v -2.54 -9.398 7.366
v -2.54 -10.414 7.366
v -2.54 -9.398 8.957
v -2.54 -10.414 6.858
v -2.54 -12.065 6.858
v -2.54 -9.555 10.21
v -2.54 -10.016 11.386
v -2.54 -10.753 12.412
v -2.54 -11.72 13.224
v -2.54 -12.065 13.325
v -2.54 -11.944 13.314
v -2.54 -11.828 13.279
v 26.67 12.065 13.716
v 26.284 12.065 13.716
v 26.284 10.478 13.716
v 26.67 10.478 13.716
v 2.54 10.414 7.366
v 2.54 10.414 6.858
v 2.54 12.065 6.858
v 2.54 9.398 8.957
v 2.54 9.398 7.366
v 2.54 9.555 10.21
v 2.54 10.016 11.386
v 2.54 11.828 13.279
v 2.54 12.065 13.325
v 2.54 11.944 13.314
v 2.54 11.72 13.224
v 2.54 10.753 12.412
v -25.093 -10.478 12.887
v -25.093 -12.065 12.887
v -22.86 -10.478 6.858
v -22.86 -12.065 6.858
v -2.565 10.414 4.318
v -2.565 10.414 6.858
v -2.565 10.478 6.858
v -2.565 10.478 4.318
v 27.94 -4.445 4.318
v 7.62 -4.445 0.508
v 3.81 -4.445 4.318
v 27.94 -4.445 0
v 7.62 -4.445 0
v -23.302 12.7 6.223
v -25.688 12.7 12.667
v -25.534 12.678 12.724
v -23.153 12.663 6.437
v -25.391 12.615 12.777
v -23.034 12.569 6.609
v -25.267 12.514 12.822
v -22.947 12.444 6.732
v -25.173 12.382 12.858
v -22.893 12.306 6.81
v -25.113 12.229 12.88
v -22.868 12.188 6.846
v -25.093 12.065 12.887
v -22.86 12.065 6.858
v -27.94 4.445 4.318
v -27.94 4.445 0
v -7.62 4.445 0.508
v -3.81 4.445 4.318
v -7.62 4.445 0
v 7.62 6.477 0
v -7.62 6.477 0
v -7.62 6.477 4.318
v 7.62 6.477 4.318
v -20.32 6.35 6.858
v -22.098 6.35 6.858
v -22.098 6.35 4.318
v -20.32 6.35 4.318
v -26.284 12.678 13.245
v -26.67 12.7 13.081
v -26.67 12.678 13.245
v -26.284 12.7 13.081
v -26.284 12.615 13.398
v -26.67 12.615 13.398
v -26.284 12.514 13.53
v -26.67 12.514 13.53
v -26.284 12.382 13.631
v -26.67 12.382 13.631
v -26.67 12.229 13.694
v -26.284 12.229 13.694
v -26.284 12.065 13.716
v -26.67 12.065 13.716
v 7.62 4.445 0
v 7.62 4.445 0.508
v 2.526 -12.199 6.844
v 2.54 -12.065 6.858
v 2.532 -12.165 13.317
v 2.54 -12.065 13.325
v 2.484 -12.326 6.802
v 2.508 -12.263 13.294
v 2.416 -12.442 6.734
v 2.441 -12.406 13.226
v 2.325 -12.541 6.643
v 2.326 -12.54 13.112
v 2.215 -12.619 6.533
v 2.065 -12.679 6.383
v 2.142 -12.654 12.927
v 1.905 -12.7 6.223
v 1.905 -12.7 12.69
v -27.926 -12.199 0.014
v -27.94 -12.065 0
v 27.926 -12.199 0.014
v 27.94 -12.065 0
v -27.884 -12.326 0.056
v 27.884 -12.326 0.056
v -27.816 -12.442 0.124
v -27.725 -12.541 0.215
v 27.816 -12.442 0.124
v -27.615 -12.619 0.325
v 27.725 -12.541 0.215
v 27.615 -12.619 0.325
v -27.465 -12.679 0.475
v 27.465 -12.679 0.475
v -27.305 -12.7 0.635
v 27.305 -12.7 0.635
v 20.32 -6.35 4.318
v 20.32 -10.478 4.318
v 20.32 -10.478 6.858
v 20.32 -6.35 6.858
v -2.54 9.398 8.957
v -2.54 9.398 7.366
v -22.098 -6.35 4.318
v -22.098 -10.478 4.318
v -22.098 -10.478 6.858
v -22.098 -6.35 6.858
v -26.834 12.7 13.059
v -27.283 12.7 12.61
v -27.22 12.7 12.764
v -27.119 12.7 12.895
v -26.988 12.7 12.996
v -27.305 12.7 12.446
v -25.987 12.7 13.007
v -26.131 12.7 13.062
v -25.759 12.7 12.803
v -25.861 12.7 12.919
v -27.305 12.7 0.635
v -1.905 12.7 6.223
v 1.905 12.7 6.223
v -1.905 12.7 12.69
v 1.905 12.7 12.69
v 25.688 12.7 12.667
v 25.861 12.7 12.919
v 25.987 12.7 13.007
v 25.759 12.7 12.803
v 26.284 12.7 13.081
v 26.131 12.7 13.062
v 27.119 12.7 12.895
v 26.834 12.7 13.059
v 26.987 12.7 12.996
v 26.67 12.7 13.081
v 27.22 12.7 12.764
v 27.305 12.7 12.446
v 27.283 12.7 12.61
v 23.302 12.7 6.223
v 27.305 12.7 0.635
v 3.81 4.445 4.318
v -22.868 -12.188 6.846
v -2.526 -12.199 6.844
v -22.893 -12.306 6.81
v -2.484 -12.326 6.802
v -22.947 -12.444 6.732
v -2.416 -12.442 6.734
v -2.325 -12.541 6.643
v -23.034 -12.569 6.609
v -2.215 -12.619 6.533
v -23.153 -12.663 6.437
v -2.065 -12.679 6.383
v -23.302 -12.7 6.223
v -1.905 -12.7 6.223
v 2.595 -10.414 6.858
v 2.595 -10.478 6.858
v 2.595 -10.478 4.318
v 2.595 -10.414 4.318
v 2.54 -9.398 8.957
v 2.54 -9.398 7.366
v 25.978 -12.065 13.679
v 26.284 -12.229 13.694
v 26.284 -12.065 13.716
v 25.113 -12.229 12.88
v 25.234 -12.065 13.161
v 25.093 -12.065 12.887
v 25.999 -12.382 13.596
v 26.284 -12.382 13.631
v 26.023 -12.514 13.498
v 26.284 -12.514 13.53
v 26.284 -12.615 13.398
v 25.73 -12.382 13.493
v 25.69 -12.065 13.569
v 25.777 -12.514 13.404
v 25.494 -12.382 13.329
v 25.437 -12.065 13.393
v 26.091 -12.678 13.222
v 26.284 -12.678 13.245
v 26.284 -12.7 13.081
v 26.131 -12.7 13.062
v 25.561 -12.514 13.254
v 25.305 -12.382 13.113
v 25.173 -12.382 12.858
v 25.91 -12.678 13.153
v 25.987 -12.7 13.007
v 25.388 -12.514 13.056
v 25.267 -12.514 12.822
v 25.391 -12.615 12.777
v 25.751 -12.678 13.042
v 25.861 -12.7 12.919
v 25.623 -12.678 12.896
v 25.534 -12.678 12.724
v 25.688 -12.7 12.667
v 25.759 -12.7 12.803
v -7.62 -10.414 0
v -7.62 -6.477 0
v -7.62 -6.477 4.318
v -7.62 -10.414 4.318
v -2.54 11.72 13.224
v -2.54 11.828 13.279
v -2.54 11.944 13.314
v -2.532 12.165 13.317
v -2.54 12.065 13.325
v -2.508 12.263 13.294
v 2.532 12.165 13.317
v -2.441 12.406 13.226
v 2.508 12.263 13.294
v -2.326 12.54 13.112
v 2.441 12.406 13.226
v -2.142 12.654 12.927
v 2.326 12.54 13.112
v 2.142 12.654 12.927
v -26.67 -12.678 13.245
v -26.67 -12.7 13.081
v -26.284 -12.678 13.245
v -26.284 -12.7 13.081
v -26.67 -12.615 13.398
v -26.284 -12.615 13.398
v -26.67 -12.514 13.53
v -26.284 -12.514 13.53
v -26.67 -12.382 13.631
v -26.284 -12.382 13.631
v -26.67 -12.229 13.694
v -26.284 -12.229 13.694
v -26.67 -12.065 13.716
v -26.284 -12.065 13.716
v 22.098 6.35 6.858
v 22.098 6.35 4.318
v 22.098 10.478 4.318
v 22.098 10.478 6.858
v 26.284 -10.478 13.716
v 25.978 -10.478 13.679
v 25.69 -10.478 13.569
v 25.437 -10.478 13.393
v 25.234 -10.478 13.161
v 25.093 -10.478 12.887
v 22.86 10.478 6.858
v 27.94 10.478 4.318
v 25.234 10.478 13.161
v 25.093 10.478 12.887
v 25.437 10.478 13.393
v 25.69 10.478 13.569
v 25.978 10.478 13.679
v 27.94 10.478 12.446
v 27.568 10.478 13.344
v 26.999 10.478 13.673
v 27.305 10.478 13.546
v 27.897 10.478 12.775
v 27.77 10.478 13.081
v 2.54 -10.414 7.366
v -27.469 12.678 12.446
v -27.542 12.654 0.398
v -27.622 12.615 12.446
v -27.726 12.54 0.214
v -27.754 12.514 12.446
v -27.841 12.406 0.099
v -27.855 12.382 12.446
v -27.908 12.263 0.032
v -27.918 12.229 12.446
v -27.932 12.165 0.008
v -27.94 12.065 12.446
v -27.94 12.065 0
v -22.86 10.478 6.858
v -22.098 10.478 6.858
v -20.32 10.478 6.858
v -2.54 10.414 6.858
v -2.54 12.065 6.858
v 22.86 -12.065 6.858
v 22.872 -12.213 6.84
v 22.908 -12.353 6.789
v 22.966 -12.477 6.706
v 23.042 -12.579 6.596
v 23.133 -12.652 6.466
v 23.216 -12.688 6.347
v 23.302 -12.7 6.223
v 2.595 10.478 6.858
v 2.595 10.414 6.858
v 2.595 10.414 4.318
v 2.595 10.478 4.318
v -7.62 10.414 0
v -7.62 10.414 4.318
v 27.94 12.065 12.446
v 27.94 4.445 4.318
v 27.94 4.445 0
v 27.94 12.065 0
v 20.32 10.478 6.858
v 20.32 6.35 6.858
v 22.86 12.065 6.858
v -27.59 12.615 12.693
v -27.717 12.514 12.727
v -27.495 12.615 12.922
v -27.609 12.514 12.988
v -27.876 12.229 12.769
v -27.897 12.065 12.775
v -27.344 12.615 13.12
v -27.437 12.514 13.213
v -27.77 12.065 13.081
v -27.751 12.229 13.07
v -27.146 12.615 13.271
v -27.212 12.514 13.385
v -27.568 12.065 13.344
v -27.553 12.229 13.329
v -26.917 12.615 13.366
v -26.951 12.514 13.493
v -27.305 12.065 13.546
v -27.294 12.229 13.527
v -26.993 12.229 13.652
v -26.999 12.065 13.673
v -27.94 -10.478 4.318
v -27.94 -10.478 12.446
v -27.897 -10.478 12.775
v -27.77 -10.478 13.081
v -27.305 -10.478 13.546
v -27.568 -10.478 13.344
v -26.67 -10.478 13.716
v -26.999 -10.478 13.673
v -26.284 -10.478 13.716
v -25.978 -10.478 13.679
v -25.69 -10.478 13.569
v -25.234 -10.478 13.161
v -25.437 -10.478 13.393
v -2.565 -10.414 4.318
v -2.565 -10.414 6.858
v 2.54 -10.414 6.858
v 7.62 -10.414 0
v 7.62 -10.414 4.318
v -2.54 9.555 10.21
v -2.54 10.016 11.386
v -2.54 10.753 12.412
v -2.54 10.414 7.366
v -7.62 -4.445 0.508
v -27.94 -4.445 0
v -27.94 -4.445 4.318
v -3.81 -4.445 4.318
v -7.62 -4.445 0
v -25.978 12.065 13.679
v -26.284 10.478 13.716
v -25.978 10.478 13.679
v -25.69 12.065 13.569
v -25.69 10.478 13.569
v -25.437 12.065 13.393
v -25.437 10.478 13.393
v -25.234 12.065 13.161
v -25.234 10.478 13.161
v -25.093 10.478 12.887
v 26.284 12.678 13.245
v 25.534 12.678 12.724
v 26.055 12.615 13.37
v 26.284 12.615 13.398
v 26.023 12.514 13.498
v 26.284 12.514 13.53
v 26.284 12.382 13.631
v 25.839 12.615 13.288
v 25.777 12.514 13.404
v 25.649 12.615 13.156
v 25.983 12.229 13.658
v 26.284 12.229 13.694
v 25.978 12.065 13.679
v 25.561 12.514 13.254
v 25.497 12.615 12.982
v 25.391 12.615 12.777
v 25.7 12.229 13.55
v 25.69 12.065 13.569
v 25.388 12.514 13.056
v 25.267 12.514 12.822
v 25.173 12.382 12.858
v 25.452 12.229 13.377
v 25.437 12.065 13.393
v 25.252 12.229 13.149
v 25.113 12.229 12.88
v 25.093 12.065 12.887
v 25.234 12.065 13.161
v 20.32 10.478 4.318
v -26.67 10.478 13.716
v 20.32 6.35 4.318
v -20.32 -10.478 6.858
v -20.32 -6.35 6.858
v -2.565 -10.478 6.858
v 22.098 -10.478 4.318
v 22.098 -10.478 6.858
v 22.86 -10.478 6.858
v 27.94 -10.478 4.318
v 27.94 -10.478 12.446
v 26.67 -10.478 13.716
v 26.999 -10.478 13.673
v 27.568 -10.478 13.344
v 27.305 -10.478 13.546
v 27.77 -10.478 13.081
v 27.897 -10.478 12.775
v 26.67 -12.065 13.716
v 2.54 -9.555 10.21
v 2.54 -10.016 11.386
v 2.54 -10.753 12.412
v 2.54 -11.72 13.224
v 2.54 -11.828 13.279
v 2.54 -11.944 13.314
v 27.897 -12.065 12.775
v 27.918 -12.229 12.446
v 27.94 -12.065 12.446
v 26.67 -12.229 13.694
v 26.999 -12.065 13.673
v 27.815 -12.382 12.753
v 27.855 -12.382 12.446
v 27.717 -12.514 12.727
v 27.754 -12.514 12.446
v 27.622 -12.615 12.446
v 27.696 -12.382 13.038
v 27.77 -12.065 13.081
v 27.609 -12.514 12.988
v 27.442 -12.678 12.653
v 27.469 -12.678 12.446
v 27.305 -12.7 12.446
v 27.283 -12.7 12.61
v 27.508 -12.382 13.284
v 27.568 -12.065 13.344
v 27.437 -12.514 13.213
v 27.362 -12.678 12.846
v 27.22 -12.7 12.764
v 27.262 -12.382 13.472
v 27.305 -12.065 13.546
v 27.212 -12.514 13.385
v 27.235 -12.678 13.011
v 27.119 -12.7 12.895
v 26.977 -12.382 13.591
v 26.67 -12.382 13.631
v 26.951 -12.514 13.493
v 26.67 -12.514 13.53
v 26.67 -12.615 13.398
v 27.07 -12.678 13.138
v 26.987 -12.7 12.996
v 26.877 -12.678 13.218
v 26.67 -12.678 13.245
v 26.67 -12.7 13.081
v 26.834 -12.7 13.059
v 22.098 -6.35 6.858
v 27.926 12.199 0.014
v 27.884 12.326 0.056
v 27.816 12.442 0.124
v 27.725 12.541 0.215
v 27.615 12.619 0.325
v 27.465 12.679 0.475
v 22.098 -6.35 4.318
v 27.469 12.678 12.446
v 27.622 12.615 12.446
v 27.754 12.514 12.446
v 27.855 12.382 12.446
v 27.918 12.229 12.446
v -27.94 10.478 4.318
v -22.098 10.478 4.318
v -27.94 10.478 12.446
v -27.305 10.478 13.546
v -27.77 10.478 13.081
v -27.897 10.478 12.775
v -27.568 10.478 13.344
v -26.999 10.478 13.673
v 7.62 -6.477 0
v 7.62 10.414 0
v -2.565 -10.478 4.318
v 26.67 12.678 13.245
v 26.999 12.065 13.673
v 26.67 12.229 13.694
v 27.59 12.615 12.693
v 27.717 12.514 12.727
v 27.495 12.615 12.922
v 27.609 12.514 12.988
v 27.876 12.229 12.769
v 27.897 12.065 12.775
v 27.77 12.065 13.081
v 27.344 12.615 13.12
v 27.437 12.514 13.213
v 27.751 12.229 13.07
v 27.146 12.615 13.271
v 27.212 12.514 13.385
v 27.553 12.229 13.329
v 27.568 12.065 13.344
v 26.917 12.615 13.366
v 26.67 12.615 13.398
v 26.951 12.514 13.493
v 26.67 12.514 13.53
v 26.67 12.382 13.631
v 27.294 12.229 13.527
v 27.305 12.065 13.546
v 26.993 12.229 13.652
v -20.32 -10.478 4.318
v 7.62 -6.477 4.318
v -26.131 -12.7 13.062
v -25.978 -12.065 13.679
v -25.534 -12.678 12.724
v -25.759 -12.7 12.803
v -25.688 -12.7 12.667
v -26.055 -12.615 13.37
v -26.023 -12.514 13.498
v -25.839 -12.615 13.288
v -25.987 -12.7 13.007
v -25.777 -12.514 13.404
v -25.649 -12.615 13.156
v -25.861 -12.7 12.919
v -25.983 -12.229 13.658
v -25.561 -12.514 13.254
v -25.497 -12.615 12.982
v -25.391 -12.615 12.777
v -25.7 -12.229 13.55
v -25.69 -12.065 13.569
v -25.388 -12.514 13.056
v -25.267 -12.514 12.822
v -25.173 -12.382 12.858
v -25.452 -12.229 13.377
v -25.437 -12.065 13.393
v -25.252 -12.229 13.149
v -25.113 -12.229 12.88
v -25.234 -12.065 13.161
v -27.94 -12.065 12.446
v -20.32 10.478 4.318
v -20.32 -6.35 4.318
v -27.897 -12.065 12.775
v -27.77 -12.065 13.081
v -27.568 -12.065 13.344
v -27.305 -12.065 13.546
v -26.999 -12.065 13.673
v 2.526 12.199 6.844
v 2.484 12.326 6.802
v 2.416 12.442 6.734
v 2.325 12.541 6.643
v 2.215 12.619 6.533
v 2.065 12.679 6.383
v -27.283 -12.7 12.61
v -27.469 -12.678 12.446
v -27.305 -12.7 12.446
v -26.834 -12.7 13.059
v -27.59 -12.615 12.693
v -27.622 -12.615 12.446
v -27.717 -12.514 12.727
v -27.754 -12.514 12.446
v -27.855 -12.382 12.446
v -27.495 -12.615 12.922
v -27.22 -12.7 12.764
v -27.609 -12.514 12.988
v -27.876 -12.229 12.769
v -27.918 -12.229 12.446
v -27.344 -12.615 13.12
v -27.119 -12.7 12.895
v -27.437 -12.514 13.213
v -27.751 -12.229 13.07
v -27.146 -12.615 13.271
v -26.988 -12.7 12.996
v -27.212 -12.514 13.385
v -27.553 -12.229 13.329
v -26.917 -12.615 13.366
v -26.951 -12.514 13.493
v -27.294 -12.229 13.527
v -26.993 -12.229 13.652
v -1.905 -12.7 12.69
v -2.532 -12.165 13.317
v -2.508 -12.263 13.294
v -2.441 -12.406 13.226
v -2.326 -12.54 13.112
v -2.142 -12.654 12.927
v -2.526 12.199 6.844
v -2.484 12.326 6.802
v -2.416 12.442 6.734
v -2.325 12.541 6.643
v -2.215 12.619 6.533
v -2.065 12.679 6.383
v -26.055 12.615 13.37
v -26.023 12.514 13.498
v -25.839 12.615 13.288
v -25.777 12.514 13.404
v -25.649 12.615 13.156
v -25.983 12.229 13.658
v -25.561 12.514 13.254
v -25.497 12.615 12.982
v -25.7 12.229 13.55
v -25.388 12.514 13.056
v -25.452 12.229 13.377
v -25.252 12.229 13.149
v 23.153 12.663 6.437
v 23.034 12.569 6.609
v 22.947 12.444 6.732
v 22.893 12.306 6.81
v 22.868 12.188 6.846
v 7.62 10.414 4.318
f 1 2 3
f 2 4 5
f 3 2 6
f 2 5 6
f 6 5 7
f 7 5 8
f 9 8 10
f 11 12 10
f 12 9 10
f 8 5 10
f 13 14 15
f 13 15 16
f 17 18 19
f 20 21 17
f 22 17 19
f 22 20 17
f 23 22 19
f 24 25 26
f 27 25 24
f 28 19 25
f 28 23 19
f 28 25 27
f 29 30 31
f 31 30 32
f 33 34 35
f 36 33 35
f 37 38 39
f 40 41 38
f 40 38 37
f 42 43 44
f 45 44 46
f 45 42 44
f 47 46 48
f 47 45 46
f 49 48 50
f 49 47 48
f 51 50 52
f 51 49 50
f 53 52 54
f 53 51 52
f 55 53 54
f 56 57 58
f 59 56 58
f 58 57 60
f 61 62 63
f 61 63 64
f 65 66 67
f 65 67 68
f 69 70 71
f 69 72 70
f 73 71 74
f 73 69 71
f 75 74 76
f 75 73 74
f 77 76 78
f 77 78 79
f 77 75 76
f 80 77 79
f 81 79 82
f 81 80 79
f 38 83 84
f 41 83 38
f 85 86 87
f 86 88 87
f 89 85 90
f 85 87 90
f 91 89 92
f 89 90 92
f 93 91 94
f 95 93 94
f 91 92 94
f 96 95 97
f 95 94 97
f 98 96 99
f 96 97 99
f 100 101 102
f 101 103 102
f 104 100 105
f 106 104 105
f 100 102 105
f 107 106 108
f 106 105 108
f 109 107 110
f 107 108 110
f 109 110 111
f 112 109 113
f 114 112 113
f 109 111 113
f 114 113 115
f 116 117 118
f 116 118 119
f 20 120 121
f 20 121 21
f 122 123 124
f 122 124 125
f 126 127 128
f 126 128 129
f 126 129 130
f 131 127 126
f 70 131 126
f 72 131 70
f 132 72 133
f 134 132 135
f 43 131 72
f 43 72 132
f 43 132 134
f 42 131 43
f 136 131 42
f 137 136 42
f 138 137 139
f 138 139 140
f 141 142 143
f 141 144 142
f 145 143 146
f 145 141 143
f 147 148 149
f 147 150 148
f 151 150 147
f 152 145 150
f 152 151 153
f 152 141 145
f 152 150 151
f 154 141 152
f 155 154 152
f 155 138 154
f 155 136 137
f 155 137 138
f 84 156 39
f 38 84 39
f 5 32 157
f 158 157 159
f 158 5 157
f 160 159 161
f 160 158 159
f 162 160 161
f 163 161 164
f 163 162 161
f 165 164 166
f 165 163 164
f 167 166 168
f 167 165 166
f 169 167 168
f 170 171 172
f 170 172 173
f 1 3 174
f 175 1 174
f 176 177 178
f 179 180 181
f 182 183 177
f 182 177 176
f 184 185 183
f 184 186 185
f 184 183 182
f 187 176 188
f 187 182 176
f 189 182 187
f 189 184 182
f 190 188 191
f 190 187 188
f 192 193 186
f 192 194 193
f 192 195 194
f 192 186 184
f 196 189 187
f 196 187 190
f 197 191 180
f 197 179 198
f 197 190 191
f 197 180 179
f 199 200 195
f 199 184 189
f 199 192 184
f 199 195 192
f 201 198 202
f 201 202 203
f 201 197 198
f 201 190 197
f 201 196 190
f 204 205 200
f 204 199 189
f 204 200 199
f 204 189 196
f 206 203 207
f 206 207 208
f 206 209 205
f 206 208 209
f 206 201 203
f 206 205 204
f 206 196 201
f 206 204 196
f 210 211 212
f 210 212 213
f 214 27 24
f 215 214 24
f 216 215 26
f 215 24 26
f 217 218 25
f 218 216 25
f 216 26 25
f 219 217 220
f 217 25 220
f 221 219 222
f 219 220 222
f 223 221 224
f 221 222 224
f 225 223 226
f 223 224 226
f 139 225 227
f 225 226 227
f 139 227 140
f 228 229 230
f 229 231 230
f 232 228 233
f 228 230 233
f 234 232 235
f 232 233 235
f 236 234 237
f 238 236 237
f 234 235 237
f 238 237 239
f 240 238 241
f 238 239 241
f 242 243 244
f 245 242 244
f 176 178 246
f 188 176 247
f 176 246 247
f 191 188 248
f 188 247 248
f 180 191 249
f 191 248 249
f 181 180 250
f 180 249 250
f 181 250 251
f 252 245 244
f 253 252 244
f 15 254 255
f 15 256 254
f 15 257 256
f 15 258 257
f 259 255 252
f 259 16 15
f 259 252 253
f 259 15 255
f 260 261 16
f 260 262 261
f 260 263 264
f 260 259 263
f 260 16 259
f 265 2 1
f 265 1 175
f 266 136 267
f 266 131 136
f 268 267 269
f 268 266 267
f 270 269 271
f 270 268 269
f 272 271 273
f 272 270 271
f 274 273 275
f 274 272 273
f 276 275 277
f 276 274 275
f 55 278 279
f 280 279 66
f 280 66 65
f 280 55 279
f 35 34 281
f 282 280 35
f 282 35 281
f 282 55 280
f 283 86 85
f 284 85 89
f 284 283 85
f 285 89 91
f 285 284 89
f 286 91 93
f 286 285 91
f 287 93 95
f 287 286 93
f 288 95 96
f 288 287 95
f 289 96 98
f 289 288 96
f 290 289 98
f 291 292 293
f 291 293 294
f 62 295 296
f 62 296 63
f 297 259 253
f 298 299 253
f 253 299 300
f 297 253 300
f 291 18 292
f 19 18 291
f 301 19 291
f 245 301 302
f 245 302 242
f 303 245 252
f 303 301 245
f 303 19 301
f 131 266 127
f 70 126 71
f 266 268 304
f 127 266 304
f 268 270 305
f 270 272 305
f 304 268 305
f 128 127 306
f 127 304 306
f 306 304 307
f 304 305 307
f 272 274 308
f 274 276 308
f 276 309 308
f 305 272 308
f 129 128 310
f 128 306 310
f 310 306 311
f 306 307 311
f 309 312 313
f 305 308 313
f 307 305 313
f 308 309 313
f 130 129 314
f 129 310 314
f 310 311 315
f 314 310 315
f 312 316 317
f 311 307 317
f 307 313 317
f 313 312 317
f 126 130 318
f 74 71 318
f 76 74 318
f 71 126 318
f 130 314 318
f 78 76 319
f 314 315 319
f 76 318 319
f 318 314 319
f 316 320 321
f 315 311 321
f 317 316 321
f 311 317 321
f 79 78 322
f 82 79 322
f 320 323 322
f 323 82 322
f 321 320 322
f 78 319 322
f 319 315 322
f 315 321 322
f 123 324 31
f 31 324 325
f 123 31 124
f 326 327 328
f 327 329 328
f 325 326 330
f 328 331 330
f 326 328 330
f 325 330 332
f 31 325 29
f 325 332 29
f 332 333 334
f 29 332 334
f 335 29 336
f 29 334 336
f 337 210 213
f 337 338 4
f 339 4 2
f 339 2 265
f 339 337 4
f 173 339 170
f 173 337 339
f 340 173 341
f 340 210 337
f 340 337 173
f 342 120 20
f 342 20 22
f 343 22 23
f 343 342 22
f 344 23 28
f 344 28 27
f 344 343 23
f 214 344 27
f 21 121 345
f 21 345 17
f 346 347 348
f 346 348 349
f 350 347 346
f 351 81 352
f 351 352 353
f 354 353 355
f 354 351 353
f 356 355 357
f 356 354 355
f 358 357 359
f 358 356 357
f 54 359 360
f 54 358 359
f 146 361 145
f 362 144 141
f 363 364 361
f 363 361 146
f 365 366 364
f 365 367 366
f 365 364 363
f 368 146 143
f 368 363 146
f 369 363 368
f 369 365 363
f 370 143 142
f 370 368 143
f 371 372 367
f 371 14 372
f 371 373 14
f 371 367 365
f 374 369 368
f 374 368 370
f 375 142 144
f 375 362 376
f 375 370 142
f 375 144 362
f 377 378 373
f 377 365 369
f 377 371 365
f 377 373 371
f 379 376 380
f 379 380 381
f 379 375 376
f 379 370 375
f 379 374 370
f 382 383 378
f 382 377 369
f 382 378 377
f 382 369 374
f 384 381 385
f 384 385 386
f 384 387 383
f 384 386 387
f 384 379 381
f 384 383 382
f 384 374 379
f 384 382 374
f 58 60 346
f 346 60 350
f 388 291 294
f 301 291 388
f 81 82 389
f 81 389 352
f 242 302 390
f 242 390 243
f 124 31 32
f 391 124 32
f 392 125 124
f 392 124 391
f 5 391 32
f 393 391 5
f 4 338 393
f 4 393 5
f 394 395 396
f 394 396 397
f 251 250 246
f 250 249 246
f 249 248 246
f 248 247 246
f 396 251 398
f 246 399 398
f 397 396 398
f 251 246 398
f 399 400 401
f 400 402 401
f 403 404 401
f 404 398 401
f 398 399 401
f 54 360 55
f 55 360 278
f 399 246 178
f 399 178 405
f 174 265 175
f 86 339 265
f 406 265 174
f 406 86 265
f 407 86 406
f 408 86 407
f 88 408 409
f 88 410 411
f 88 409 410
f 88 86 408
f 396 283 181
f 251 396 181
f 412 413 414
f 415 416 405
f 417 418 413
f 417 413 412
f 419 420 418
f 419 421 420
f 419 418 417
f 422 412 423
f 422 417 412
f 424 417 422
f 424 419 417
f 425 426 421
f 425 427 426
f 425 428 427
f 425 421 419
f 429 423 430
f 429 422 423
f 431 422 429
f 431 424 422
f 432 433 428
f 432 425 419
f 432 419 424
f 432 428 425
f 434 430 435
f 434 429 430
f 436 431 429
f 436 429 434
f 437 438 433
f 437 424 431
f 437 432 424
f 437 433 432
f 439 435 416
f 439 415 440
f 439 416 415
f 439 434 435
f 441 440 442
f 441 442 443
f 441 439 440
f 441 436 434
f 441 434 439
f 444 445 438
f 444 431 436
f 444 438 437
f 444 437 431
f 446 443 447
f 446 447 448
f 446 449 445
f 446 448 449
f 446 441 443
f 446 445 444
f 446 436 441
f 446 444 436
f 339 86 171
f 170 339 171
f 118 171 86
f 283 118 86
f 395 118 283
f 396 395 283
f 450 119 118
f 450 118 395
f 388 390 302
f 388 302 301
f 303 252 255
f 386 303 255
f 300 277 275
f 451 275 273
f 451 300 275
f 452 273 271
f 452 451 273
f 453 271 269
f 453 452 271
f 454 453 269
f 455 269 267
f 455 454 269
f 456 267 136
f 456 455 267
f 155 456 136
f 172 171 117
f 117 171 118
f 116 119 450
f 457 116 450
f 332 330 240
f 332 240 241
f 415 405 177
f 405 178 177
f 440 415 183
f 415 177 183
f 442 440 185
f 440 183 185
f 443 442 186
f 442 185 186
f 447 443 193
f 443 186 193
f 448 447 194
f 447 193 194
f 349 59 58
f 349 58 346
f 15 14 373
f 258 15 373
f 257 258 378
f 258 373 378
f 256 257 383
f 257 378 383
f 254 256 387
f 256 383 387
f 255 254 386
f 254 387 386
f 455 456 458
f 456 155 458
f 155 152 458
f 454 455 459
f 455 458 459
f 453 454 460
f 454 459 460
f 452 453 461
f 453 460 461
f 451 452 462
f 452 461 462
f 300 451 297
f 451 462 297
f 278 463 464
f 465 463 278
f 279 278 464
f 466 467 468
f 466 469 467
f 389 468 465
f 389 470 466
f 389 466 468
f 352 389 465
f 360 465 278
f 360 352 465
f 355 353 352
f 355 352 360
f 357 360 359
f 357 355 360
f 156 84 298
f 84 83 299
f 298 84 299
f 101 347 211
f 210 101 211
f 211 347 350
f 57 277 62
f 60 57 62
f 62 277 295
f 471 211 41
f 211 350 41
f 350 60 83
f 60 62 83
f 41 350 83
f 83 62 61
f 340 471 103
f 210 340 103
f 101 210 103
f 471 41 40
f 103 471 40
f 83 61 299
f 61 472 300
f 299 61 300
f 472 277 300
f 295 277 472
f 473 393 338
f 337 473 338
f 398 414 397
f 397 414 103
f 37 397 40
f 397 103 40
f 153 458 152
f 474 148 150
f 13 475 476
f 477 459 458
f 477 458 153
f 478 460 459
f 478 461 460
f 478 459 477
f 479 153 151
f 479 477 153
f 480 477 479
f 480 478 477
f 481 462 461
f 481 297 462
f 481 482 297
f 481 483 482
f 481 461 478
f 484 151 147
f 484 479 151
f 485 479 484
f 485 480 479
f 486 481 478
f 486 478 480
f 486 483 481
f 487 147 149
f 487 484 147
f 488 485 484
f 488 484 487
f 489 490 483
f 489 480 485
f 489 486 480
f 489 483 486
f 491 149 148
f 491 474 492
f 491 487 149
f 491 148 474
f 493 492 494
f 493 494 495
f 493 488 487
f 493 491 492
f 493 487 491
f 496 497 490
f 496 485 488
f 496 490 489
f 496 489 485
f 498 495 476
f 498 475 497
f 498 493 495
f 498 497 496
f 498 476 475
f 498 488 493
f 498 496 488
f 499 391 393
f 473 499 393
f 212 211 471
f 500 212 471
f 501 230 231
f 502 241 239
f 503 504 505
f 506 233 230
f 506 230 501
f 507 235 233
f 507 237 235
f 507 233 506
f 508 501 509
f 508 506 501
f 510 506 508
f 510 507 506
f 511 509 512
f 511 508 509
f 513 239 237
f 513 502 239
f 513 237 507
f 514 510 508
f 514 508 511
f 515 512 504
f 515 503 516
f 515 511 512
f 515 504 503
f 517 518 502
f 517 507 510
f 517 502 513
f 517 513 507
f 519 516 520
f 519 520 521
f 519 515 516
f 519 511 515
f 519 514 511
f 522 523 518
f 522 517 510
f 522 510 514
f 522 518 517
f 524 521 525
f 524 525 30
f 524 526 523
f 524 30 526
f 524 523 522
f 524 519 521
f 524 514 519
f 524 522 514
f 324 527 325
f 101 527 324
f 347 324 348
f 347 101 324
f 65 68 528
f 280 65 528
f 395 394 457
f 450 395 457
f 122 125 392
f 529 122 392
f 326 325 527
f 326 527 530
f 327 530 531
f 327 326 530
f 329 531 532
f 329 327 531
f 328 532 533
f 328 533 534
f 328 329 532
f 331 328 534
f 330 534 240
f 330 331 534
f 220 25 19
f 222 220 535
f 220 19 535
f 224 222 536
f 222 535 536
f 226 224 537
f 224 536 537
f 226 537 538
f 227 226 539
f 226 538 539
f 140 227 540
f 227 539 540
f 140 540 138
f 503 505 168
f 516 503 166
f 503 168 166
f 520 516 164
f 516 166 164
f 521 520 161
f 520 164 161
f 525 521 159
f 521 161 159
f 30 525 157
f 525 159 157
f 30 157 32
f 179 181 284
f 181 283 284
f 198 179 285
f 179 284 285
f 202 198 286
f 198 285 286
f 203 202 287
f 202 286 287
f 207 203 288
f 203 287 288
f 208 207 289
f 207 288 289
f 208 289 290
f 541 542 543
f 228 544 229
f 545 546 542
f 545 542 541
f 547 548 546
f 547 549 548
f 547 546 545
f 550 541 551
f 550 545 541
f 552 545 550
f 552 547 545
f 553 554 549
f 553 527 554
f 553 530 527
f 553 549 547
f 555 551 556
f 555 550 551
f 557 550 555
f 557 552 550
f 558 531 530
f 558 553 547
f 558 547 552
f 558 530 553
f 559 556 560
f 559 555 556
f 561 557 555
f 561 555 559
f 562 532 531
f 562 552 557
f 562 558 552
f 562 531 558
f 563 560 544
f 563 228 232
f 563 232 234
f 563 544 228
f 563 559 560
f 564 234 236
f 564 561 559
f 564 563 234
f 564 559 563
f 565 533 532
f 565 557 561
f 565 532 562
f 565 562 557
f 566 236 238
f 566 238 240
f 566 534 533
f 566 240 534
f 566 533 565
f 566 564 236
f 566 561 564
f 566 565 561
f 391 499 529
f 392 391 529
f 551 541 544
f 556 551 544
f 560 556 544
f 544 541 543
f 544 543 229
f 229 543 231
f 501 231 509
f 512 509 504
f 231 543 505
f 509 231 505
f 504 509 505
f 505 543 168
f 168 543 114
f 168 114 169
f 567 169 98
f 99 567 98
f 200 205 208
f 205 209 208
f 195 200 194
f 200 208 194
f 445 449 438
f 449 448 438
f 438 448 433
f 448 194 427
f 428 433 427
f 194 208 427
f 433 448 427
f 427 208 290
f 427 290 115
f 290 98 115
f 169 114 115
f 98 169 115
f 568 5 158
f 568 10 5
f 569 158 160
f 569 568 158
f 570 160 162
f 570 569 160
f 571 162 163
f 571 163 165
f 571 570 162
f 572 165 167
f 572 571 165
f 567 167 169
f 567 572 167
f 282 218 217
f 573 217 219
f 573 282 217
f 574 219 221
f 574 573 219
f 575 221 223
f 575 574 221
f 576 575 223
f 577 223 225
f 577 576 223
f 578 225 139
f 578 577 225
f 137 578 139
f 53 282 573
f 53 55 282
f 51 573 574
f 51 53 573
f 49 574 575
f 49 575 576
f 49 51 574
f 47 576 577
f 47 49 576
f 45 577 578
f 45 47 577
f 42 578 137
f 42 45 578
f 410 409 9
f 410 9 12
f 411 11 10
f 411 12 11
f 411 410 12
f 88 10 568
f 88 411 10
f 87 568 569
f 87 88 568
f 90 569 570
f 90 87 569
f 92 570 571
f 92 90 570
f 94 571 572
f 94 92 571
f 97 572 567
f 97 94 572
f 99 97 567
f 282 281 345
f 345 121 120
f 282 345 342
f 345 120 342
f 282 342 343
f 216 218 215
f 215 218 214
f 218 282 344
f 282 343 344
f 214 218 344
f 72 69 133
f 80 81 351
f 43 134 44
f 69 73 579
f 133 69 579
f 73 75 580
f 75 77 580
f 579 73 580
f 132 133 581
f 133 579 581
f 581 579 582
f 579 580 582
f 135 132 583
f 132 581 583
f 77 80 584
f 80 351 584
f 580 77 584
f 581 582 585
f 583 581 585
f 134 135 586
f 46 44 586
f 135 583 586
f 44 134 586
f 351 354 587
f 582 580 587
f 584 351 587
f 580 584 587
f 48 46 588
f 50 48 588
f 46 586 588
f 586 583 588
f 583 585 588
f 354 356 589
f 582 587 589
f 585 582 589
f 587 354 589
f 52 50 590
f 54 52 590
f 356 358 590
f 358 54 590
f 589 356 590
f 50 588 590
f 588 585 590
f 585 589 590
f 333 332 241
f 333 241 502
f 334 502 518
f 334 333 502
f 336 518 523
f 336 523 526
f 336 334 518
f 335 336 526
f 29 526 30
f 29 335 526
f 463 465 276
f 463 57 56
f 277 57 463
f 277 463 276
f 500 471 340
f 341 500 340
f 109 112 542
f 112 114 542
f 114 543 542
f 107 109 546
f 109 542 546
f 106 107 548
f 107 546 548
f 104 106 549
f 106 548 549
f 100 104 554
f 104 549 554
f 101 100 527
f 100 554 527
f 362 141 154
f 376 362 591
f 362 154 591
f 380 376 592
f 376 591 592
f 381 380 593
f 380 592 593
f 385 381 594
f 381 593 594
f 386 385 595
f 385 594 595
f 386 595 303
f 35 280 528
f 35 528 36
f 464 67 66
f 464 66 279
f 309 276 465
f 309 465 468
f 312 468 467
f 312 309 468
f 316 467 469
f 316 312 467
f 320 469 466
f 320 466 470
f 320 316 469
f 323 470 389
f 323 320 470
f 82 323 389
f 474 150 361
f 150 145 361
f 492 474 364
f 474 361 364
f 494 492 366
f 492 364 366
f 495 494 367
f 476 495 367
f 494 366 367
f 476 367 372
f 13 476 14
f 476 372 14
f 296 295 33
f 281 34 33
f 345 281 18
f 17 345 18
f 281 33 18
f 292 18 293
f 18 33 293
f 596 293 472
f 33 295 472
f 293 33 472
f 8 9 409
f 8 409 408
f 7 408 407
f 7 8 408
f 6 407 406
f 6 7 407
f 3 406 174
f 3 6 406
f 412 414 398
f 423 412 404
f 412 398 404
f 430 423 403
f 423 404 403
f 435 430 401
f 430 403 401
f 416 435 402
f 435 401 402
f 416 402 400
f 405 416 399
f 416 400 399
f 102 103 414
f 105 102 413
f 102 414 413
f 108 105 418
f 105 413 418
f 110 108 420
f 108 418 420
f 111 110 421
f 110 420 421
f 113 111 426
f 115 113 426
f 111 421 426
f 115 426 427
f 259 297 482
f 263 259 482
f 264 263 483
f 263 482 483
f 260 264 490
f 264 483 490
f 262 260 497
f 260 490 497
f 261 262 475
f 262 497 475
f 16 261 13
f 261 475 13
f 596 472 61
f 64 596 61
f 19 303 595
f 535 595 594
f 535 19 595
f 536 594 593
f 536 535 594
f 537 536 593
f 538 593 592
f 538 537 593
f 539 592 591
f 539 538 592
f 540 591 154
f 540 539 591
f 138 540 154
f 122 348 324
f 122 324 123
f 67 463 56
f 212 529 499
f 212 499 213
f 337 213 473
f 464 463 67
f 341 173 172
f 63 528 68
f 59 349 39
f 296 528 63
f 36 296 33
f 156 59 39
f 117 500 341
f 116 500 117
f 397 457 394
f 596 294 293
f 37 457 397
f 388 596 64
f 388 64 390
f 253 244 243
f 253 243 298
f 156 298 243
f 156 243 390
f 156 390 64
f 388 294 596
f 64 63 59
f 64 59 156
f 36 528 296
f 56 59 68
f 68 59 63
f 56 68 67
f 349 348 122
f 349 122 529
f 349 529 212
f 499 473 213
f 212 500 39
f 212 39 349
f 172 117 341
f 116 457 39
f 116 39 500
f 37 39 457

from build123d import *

# Parameters (mm, degrees)
F0_W         = 55.88
F0_H         = 25.4
F1_DEPTH     = 13.716
F2_W         = 20.32
F2_H         = 8.89
F3_DEPTH     = 13.717
F4_W         = 20.32
F4_H         = 8.89
F5_DEPTH     = 13.717
F6_W         = 15.24
F6_H         = 3.937
F7_DEPTH     = 7.366
F8_W         = 15.24
F8_H         = 3.937
F9_DEPTH     = 7.366
F10_W        = 55.88
F10_H        = 18.796
F11_DEPTH    = 9.398
F12_W        = 20.32
F12_H        = 6.858
F13_DEPTH    = 25.401
F14_W        = 20.32
F14_H        = 6.858
F15_DEPTH    = 25.401
F17_DEPTH    = 25.401
F19_DEPTH    = 25.401
F20_R        = 1.27
F21_W        = 38.1
F21_H        = 20.955
F22_DEPTH    = 9.398
F23_W        = 38.1
F23_H        = 20.955
F24_DEPTH    = 9.398
F25_T1_DEPTH = 28.8734423739
F26_W        = 1.778
F26_H        = 20.955
F27_DEPTH    = 2.54
F28_W        = 1.778
F28_H        = 20.955
F29_DEPTH    = 2.54
F30_W        = 55.88
F30_H        = 12.7
F31_DEPTH    = 2.54
F32_SIZE     = 3.81
F33_R        = 0.635


# Not quite as in the source:
# - a fillet or chamfer that OpenCascade refuses, or shapes differently, is made with other operations: its cross-section is extruded or revolved along the edge and cut away or added


with BuildPart() as f1:
    # F0 (on Top) → F1 (new body)
    with BuildSketch(Plane.XY):
        Rectangle(F0_W, F0_H)
    extrude(amount=F1_DEPTH)

    # F2 (on face) → F3 (cut, through all)
    with BuildSketch(Plane(origin=(0, 0, 0), x_dir=(1, 0, 0), z_dir=(0, 0, -1))):
        with Locations((17.78, 0)):
            Rectangle(F2_W, F2_H)
    extrude(amount=-F3_DEPTH, mode=Mode.SUBTRACT)

    # F4 (on face) → F5 (cut, through all)
    with BuildSketch(Plane(origin=(0, 0, 0), x_dir=(1, 0, 0), z_dir=(0, 0, -1))):
        with Locations((-17.78, 0)):
            Rectangle(F4_W, F4_H)
    extrude(amount=-F5_DEPTH, mode=Mode.SUBTRACT)

    # F6 (on face) → F7 (cut)
    with BuildSketch(Plane(origin=(0, 0, 0), x_dir=(1, 0, 0), z_dir=(0, 0, -1))):
        with Locations((0, 8.4455)):
            Rectangle(F6_W, F6_H)
    extrude(amount=-F7_DEPTH, mode=Mode.SUBTRACT)

    # F8 (on face) → F9 (cut)
    with BuildSketch(Plane(origin=(0, 0, 0), x_dir=(1, 0, 0), z_dir=(0, 0, -1))):
        with Locations((0, -8.4455)):
            Rectangle(F8_W, F8_H)
    extrude(amount=-F9_DEPTH, mode=Mode.SUBTRACT)

    # F10 (on face) → F11 (cut)
    with BuildSketch(Plane.XY.offset(13.716)):
        Rectangle(F10_W, F10_H)
    extrude(amount=-F11_DEPTH, mode=Mode.SUBTRACT)

    # F12 (on face) → F13 (cut, through all)
    with BuildSketch(Plane.XZ.offset(12.7)):
        with Locations((-12.7, 10.287)):
            Rectangle(F12_W, F12_H)
    extrude(amount=-F13_DEPTH, mode=Mode.SUBTRACT)

    # F14 (on face) → F15 (cut, through all)
    with BuildSketch(Plane.XZ.offset(12.7)):
        with Locations((12.7, 10.287)):
            Rectangle(F14_W, F14_H)
    extrude(amount=-F15_DEPTH, mode=Mode.SUBTRACT)

    # F16 (on face) → F17 (cut, through all)
    with BuildSketch(Plane.XZ.offset(12.7)):
        Polygon((-25.4, 13.716), (-22.86, 6.858), (-22.86, 13.716), align=None)
    extrude(amount=-F17_DEPTH, mode=Mode.SUBTRACT)

    # F18 (on face) → F19 (cut, through all)
    with BuildSketch(Plane.XZ.offset(12.7)):
        Polygon((22.86, 13.716), (22.86, 6.858), (25.4, 13.716), align=None)
    extrude(amount=-F19_DEPTH, mode=Mode.SUBTRACT)

    # F20
    f20_edges = [f1.edges().sort_by_distance(p)[0] for p in [
        (-25.4, 11.049, 13.716),
        (-25.4, -11.049, 13.716),
        (25.4, 11.049, 13.716),
        (25.4, -11.049, 13.716),
        (-27.94, 11.049, 13.716),
        (-27.94, -11.049, 13.716),
        (27.94, -11.049, 13.716),
        (27.94, 11.049, 13.716),
    ]]
    fillet(f20_edges, radius=F20_R)

    # F21 (on face) → F22 (cut)
    with BuildSketch(Plane.XY.offset(13.716)):
        with Locations((-21.6148423028, 0)):
            Rectangle(F21_W, F21_H)
    extrude(amount=-F22_DEPTH, mode=Mode.SUBTRACT)

    # F23 (on face) → F24 (cut)
    with BuildSketch(Plane.XY.offset(13.716)):
        with Locations((21.6445253996, 0)):
            Rectangle(F23_W, F23_H)
    extrude(amount=-F24_DEPTH, mode=Mode.SUBTRACT)

    # F25: fillet of radius 5.08 on 2 edges, made by hand

    # F25_s2 → F25_t1 (cut)
    with BuildSketch(Plane.YZ.offset(-14.4367211869)):
        with BuildLine():
            ThreePointArc((9.398, 8.9573115252), (10.3043541118, 11.853357105), (12.7, 13.716))
            Line((12.7, 13.716), (9.398, 13.716))
            Line((9.398, 13.716), (9.398, 8.9573115252))
        make_face()
        with BuildLine():
            ThreePointArc((-12.7, 13.716), (-10.3043541118, 11.853357105), (-9.398, 8.9573115252))
            Line((-9.398, 8.9573115252), (-9.398, 13.716))
            Line((-9.398, 13.716), (-12.7, 13.716))
        make_face()
    extrude(amount=F25_T1_DEPTH, mode=Mode.SUBTRACT)

    # F26 (on face) → F27 (join)
    with BuildSketch(Plane.XY.offset(4.318)):
        with Locations((21.209, 0)):
            Rectangle(F26_W, F26_H)
    extrude(amount=F27_DEPTH)

    # F28 (on face) → F29 (join)
    with BuildSketch(Plane.XY.offset(4.318)):
        with Locations((-21.209, 0)):
            Rectangle(F28_W, F28_H)
    extrude(amount=F29_DEPTH)

    # F30 (on face) → F31 (cut)
    with BuildSketch(Plane.XY.offset(6.858)):
        with Locations((-0.1600864343, 0)):
            Rectangle(F30_W, F30_H)
    extrude(amount=-F31_DEPTH, mode=Mode.SUBTRACT)

    # F32
    f32_edges = [f1.edges().sort_by_distance(p)[0] for p in [
        (7.62, 0, 4.318),
        (-7.62, 0, 4.318),
    ]]
    chamfer(f32_edges, length=F32_SIZE)

    # F33
    f33_edges = [f1.edges().sort_by_distance(p)[0] for p in [
        (27.94, -12.7, 6.223),
        (27.568026, -12.7, 13.344026),
        (0, -12.7, 0),
        (26.476968, -12.7, 13.716),
        (-27.94, -12.7, 6.223),
        (25.558431, -12.7, 13.488373),
        (-27.568026, -12.7, 13.344026),
        (23.976498, -12.7, 9.872545),
        (-26.476968, -12.7, 13.716),
        (12.7, -12.7, 6.858),
        (-25.558431, -12.7, 13.488373),
        (2.54, -12.7, 10.287),
        (-23.976498, -12.7, 9.872545),
        (0, -12.7, 13.716),
        (-12.7, -12.7, 6.858),
        (-2.54, -12.7, 10.287),
        (-27.94, 12.7, 6.223),
        (-27.568026, 12.7, 13.344026),
        (0, 12.7, 0),
        (-26.476968, 12.7, 13.716),
        (27.94, 12.7, 6.223),
        (-25.558431, 12.7, 13.488373),
        (27.568026, 12.7, 13.344026),
        (-23.976498, 12.7, 9.872545),
        (26.476968, 12.7, 13.716),
        (-12.7, 12.7, 6.858),
        (25.558431, 12.7, 13.488373),
        (-2.54, 12.7, 10.287),
        (23.976498, 12.7, 9.872545),
        (0, 12.7, 13.716),
        (12.7, 12.7, 6.858),
        (2.54, 12.7, 10.287),
    ]]
    fillet(f33_edges, radius=F33_R)


solid = f1.part
